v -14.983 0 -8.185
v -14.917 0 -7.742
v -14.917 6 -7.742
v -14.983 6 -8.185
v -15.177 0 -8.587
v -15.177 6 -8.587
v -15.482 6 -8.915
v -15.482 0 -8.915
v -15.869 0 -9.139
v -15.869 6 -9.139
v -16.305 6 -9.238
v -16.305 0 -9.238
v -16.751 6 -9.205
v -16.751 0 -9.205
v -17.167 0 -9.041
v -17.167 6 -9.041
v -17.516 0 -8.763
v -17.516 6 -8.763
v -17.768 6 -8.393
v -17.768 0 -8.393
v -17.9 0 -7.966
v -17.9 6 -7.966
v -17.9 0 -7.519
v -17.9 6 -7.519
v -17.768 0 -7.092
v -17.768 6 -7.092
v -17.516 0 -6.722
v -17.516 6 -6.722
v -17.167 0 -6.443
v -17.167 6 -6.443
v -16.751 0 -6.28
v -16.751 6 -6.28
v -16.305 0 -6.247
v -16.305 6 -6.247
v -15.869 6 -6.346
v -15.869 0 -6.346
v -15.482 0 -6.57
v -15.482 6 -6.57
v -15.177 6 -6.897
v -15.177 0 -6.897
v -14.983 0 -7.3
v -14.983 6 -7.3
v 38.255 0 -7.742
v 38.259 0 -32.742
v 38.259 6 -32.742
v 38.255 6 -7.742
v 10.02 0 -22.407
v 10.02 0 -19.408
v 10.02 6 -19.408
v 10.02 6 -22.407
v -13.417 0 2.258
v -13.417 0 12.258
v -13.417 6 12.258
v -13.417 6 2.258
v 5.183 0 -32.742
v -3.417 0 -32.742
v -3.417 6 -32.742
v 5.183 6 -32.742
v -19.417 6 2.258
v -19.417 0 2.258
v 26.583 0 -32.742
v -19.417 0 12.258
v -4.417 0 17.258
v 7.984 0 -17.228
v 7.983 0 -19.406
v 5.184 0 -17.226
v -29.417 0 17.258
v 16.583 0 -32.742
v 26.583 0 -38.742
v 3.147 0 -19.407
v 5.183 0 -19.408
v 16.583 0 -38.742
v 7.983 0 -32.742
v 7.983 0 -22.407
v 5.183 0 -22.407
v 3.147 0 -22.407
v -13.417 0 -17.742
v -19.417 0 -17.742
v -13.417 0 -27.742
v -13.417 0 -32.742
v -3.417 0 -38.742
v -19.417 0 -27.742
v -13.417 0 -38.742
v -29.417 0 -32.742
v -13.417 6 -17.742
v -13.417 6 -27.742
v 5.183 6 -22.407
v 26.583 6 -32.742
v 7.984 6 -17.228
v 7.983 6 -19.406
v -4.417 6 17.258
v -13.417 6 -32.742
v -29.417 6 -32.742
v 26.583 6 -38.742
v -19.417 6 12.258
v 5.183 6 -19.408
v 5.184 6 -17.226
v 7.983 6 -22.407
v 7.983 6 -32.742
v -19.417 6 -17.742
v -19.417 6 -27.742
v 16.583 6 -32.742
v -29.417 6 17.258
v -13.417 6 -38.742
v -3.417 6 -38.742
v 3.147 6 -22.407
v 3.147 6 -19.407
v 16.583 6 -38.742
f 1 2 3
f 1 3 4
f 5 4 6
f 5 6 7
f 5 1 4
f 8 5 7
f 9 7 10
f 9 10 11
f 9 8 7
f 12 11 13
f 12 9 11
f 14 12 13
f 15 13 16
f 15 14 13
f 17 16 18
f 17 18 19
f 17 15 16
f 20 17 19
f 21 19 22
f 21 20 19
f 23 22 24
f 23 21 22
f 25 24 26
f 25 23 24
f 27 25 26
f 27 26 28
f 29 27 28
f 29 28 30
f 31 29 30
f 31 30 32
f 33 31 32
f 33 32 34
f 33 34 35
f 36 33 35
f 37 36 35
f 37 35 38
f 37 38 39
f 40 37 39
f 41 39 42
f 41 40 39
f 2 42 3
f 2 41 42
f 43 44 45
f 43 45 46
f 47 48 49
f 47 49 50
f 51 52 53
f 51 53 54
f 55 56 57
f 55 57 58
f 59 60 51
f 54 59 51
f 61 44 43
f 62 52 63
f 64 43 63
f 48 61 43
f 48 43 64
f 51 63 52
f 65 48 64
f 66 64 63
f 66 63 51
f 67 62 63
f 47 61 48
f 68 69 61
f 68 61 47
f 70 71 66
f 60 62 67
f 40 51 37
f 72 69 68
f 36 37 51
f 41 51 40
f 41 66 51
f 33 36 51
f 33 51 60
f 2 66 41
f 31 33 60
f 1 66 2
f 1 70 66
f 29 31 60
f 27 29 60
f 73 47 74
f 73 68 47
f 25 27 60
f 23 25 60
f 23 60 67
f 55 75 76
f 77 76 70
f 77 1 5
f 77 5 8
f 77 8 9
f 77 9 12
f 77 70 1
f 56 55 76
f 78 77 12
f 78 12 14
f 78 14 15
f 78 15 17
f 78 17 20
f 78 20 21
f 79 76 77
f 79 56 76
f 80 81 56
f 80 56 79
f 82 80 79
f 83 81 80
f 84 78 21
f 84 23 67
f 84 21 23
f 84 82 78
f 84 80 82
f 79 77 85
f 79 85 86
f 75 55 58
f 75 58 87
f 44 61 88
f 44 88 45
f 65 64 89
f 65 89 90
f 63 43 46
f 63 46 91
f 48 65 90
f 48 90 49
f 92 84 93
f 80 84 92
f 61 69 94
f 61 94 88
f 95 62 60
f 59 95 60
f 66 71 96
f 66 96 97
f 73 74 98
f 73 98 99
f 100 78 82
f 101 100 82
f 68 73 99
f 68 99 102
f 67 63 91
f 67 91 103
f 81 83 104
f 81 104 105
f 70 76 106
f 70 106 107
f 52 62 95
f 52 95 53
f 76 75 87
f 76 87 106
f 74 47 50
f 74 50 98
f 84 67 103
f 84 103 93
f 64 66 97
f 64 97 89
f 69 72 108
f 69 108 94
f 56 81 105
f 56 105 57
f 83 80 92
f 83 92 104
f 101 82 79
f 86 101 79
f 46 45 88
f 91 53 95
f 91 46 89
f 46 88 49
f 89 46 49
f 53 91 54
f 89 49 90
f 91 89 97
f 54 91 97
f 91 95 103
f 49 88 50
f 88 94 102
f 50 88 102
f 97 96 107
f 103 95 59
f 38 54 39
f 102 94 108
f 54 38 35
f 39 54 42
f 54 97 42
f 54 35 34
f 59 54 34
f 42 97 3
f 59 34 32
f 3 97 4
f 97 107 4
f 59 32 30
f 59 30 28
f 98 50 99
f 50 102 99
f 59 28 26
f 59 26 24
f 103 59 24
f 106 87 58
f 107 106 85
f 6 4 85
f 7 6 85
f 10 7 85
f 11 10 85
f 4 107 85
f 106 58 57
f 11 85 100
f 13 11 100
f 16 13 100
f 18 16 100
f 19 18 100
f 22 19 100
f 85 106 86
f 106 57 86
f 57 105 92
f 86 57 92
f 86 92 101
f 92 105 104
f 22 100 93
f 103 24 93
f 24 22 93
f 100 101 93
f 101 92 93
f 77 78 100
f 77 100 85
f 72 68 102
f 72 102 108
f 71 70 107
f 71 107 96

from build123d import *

# Parameters (mm, degrees)
SKETCH_1_R      = 1.5
SKETCH_1_W      = 6
SKETCH_1_H      = 10
EXTRUDE_2_DEPTH = 6


with BuildPart() as part:
    # Эскиз1 → Бобышка-Вытянуть2 (new body)
    with BuildSketch(Plane(origin=(0, 0, 0), x_dir=(1, 0, 0), z_dir=(0, 1, 0))):
        Polygon((-3.416793382, 32.742423734), (5.183206618, 32.742423734), (5.183206618, 22.407164878), (3.146696627, 22.407214255), (3.146623876, 19.406616385), (5.182814398, 19.407762757), (5.184095658, 17.225944952), (7.984095175, 17.227589235), (7.982815638, 19.406473379), (10.020338121, 19.407669902), (10.020410843, 22.407047597), (7.983206618, 22.40709699), (7.983206618, 32.742423734), (16.583206618, 32.742423734), (16.583206618, 38.742423734), (26.583206618, 38.742423734), (26.583206618, 32.742423734), (38.259419898, 32.742423734), (38.255234849, 7.742423734), (-4.416793382, -17.257576266), (-29.416793382, -17.257576266), (-29.416793382, 32.742423734), (-13.416793382, 32.742423734), (-13.416793382, 38.742423734), (-3.416793382, 38.742423734), align=None)
        with Locations((-16.416793382, 7.742423734)):
            Circle(SKETCH_1_R, mode=Mode.SUBTRACT)
        with Locations((-16.416793382, 22.742423734)):
            Rectangle(SKETCH_1_W, SKETCH_1_H, mode=Mode.SUBTRACT)
        with Locations((-16.416793382, -7.257576266)):
            Rectangle(SKETCH_1_W, SKETCH_1_H, mode=Mode.SUBTRACT)
    extrude(amount=EXTRUDE_2_DEPTH)


solid = part.part
